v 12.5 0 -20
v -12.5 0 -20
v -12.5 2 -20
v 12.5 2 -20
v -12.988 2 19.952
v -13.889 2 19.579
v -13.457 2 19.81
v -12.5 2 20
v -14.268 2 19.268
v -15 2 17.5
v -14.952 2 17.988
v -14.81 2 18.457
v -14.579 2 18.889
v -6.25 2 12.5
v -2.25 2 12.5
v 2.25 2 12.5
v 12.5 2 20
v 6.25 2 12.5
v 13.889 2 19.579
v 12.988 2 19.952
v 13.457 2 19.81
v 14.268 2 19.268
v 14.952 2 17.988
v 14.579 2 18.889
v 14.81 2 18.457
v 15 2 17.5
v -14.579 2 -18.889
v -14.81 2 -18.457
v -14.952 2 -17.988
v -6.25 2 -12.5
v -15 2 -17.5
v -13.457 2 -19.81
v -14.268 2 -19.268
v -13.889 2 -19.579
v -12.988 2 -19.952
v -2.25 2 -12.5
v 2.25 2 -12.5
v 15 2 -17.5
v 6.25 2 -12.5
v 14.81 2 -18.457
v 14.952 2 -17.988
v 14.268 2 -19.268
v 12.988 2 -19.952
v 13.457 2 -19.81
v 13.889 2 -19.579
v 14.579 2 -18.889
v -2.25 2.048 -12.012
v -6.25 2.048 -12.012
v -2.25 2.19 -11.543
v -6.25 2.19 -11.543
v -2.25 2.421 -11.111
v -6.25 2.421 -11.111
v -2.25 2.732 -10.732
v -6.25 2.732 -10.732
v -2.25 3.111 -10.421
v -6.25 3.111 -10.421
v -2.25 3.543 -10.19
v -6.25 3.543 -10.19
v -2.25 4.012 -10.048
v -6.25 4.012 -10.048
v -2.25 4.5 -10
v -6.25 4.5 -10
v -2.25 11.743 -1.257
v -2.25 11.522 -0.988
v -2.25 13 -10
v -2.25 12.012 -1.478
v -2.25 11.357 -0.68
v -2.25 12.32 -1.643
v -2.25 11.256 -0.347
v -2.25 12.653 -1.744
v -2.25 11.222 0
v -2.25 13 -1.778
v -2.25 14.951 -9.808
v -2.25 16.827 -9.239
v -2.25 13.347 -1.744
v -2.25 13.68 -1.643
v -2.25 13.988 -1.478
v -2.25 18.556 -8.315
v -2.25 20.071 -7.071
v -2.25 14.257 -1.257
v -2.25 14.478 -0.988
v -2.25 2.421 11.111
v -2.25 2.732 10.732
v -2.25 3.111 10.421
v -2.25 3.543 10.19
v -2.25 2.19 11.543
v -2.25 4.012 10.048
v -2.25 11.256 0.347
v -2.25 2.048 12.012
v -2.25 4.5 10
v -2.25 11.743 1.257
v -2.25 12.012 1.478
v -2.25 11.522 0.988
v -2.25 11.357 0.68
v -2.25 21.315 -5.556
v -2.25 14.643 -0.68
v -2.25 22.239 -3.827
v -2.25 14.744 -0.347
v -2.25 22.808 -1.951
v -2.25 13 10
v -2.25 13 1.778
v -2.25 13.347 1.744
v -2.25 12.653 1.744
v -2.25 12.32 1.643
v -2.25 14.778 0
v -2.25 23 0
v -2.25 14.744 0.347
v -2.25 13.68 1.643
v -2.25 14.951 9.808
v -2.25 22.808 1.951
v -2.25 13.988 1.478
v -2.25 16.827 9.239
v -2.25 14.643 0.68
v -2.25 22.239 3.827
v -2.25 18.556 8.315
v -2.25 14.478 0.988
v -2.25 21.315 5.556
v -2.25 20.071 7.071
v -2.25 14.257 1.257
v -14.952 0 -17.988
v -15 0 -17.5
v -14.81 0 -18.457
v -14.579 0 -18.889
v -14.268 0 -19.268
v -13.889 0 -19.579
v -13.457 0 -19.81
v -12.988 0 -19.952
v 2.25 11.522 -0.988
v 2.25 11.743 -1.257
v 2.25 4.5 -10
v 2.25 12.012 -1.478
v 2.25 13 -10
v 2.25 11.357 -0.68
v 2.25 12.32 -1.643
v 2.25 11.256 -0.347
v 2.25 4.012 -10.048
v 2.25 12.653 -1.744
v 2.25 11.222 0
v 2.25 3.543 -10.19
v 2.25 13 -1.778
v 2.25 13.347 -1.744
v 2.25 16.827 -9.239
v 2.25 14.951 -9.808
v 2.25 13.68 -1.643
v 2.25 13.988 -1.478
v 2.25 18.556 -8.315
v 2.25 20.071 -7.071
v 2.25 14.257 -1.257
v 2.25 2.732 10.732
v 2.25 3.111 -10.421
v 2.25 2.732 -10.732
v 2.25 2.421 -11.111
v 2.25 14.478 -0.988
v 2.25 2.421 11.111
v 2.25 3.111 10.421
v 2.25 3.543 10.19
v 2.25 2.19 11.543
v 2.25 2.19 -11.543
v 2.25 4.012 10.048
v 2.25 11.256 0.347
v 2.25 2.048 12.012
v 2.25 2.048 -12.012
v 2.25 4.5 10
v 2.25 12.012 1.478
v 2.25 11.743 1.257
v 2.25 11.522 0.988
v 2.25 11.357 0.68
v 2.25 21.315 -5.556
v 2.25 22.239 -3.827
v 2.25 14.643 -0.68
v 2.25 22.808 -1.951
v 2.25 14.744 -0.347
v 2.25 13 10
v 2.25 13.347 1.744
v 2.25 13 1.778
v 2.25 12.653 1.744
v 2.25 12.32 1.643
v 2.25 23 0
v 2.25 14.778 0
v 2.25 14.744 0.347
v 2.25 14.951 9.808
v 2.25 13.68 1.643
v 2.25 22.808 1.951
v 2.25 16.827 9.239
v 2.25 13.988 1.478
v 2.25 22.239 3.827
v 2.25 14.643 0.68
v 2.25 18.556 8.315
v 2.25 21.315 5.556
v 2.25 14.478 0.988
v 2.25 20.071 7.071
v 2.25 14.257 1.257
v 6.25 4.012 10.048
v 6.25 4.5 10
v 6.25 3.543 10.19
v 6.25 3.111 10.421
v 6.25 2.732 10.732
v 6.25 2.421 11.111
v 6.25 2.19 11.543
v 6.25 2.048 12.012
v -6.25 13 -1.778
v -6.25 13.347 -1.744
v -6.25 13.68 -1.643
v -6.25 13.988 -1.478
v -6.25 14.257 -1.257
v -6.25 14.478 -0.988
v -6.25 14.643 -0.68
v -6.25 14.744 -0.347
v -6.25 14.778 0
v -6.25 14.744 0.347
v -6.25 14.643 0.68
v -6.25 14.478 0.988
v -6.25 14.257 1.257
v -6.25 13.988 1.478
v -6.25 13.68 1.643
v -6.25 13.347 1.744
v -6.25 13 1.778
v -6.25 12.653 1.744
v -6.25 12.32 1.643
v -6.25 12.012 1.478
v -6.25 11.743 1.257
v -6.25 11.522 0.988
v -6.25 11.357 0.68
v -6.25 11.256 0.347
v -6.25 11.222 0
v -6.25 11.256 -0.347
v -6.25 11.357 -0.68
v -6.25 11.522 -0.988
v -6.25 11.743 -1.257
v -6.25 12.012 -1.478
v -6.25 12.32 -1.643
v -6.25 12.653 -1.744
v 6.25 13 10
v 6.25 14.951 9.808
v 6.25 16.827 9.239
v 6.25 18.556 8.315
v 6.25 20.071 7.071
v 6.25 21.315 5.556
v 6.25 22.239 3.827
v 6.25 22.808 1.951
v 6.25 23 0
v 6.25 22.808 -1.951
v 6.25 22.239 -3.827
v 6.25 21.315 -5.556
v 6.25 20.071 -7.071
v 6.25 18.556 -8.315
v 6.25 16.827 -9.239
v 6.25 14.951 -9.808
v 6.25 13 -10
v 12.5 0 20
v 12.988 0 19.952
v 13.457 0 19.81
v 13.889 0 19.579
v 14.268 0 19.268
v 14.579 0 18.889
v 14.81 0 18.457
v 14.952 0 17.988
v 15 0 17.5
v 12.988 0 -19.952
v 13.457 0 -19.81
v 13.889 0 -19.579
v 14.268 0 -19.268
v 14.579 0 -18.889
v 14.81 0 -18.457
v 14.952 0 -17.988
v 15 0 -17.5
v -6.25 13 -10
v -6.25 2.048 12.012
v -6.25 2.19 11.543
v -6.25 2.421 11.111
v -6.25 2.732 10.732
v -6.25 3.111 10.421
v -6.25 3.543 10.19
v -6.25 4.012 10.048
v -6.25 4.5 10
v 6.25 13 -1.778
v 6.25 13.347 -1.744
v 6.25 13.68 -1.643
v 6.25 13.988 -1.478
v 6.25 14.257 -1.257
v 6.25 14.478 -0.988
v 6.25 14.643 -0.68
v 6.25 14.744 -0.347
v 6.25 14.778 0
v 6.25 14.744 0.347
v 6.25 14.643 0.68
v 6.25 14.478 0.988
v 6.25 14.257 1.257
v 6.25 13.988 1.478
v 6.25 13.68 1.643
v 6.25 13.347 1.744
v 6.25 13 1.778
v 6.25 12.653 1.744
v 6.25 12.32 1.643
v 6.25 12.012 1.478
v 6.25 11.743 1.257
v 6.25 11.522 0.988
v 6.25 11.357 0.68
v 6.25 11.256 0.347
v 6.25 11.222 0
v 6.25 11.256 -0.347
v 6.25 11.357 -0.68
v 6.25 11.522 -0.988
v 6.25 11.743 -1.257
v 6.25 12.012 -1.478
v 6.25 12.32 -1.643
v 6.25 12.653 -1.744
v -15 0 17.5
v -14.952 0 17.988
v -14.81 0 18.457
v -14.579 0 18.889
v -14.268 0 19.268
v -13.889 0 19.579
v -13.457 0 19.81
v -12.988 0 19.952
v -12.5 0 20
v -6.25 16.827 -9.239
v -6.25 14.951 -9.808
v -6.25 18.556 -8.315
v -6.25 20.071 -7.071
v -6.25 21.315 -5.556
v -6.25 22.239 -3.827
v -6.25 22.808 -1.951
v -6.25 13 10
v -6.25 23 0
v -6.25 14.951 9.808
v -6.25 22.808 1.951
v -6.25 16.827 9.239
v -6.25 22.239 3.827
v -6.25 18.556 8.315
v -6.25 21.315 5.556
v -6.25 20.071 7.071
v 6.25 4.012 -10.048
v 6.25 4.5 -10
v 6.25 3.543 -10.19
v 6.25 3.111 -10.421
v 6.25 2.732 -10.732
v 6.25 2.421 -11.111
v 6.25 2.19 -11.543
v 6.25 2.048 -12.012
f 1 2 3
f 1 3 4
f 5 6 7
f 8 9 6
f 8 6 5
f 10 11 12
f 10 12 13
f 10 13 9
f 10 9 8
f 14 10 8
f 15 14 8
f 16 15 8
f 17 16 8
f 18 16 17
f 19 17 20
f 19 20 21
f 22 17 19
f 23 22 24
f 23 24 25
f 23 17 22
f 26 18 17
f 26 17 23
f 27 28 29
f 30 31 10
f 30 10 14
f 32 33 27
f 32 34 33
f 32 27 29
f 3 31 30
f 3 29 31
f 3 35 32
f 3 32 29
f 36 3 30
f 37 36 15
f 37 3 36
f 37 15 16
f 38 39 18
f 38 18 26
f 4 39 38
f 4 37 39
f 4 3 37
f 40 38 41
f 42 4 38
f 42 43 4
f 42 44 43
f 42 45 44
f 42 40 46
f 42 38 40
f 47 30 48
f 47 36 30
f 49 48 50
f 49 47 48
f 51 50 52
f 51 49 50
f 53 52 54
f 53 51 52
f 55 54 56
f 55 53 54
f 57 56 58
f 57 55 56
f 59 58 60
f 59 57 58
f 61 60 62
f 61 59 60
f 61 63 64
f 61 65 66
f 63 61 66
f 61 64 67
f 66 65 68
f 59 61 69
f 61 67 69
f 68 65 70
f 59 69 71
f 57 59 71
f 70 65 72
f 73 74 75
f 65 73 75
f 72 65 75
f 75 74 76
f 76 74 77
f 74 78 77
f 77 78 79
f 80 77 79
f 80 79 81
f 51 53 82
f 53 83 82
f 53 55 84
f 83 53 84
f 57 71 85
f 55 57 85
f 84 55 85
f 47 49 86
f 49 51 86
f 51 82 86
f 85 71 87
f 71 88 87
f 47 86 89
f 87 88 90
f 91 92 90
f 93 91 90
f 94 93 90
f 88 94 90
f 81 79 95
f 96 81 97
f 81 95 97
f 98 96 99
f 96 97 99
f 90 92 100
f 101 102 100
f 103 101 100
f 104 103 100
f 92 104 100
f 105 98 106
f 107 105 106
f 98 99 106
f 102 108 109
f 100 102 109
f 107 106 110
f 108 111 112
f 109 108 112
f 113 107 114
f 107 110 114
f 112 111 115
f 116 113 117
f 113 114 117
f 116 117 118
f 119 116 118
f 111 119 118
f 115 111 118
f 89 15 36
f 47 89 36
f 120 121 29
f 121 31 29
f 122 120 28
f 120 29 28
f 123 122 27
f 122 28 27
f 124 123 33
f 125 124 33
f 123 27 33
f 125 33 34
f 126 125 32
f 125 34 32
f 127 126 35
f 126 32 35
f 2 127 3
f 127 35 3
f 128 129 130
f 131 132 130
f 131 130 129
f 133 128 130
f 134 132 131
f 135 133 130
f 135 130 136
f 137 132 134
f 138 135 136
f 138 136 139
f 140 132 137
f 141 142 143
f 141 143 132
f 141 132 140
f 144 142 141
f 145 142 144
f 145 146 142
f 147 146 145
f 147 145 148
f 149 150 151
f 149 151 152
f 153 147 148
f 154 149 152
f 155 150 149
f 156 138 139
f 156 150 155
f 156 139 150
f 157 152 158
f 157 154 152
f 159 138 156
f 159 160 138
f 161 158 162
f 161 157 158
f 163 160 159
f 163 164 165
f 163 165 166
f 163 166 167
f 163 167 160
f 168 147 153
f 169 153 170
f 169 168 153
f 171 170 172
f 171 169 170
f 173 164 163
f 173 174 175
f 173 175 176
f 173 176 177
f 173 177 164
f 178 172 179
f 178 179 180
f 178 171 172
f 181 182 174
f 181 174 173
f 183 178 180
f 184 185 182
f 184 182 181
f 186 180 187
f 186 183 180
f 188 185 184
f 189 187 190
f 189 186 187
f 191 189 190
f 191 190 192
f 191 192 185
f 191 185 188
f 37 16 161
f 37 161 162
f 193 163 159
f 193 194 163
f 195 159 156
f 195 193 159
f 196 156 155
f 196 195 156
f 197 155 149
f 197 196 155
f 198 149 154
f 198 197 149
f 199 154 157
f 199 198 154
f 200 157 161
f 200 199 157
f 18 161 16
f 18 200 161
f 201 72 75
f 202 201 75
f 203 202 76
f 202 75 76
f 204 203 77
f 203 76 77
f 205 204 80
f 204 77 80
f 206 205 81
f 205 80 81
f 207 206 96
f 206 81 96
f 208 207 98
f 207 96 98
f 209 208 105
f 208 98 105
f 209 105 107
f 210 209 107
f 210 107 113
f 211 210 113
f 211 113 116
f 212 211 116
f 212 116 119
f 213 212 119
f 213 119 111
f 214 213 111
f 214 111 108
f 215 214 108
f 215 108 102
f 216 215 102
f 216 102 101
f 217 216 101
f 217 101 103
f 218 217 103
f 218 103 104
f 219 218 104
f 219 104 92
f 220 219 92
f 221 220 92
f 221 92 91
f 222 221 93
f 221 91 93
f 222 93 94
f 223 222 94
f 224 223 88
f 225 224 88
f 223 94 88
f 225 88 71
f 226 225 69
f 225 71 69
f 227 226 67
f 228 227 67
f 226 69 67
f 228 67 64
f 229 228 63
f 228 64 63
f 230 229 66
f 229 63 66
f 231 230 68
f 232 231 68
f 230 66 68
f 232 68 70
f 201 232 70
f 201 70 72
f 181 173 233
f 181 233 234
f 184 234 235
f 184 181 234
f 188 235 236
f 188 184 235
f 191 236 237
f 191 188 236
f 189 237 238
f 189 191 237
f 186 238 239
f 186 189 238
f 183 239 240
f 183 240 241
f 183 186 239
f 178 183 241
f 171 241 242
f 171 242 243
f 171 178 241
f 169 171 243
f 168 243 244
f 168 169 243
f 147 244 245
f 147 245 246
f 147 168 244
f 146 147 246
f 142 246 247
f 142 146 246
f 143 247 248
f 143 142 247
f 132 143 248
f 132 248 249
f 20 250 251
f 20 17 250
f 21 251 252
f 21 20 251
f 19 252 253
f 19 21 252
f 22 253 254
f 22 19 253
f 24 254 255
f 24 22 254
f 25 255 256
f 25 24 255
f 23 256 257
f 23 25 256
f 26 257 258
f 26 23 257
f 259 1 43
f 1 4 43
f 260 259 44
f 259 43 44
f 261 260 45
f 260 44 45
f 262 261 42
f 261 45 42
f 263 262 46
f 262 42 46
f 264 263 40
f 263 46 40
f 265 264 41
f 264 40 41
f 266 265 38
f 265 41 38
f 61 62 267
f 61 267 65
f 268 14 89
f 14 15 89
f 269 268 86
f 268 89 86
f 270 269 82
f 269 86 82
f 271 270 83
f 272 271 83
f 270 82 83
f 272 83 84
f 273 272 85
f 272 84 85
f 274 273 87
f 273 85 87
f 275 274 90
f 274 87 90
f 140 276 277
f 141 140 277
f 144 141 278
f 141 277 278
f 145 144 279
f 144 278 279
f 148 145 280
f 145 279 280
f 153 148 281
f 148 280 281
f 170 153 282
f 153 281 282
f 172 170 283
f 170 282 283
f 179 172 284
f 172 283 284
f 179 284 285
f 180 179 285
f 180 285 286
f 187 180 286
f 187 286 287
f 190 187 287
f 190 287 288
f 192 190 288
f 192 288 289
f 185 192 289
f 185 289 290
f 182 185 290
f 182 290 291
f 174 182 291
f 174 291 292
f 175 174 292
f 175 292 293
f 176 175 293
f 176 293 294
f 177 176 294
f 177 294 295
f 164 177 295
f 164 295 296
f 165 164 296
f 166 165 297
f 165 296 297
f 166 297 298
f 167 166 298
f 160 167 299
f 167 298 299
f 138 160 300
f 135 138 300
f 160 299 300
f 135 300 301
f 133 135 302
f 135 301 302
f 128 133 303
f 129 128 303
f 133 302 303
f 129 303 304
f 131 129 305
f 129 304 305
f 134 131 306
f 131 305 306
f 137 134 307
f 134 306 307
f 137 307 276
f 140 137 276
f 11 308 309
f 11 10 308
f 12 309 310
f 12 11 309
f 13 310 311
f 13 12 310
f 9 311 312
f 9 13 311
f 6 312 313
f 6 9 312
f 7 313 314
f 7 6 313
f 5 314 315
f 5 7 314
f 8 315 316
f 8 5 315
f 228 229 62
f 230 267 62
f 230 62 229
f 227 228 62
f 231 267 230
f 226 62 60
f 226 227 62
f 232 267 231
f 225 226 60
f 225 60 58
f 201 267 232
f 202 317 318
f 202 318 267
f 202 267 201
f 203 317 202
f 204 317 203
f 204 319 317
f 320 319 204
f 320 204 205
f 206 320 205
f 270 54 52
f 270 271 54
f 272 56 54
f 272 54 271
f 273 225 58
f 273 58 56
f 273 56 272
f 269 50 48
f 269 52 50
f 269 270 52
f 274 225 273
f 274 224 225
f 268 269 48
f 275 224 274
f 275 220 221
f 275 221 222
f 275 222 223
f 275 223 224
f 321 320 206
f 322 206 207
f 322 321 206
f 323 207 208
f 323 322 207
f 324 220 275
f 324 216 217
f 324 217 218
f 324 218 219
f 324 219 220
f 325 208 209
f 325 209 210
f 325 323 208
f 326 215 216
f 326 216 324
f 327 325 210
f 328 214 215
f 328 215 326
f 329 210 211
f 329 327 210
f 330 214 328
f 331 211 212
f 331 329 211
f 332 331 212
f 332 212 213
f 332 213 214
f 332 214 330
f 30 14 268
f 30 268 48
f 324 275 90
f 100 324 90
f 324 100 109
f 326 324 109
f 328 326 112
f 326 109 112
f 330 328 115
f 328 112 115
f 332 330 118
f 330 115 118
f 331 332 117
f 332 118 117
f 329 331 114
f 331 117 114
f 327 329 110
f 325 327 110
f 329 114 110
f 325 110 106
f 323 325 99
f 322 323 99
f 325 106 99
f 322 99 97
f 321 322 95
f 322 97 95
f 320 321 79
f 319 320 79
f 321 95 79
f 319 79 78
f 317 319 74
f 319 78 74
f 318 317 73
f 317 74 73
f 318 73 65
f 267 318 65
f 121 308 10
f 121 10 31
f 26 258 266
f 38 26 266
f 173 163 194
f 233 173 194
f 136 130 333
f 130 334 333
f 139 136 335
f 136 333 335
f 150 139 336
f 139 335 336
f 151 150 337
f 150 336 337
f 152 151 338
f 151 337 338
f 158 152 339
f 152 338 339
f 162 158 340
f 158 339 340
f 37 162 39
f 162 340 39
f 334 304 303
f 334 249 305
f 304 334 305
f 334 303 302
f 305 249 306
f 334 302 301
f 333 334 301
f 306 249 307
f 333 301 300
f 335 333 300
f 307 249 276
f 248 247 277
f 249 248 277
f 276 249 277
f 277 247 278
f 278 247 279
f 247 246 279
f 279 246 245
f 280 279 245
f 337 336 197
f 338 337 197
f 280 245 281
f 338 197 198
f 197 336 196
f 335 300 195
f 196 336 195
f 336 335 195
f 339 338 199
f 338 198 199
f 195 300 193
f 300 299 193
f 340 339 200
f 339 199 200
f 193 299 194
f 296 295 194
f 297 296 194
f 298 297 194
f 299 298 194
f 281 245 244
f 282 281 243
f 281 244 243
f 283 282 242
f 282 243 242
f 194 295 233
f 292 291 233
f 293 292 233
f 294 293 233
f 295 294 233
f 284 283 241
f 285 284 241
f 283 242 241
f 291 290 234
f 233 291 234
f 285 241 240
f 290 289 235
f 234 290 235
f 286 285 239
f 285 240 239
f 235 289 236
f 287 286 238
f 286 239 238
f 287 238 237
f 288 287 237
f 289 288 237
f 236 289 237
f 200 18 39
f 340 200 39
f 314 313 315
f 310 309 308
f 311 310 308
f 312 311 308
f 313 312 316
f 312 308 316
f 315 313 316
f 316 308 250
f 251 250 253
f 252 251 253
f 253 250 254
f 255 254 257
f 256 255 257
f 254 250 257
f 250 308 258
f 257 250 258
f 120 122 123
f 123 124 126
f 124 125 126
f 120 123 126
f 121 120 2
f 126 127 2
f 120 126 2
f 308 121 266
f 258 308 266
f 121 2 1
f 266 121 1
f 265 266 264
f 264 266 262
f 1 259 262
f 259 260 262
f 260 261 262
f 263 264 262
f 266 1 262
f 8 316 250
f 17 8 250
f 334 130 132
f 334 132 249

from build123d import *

# Parameters (mm, degrees)
ESQUISSE1_W             = 30
ESQUISSE1_H             = 40
BOSS_EXTRU_1_DEPTH      = 2
ESQUISSE2_W             = 4
ESQUISSE2_H             = 20
BOSS_EXTRU_2_DEPTH      = 11
BOSS_EXTRU_3_START      = -4
BOSS_EXTRU_3_DEPTH      = 4
BOSS_EXTRU_4_START      = -4
BOSS_EXTRU_4_DEPTH      = 4
ESQUISSE5_R             = 1.778
ENL_V_MAT_EXTRU_1_DEPTH = 12.5
CONG_1_R                = 2.5


with BuildPart() as part:
    # Esquisse1 → Boss.-Extru.1 (new body)
    with BuildSketch(Plane(origin=(0, 0, 0), x_dir=(1, 0, 0), z_dir=(0, 1, 0))):
        Rectangle(ESQUISSE1_W, ESQUISSE1_H)
    extrude(amount=BOSS_EXTRU_1_DEPTH)

    # Esquisse2 → Boss.-Extru.2 (add)
    with BuildSketch(Plane(origin=(0, 2, 0), x_dir=(1, 0, 0), z_dir=(0, 1, 0))):
        with Locations((4.25, 0)):
            Rectangle(ESQUISSE2_W, ESQUISSE2_H)
        with Locations((-4.25, 0)):
            Rectangle(ESQUISSE2_W, ESQUISSE2_H)
    extrude(amount=BOSS_EXTRU_2_DEPTH)

    # Esquisse3 → Boss.-Extru.3 (add)
    with BuildSketch(Plane.ZY.offset(6.25).offset(BOSS_EXTRU_3_START)):
        with BuildLine():
            Line((-10, 13), (10, 13))
            ThreePointArc((10, 13), (0, 23), (-10, 13))
        make_face()
    extrude(amount=BOSS_EXTRU_3_DEPTH)

    # Esquisse4 → Boss.-Extru.4 (add)
    with BuildSketch(Plane(origin=(6.25, 0, 0), x_dir=(0, 0, -1), z_dir=(1, 0, 0)).offset(BOSS_EXTRU_4_START)):
        with BuildLine():
            Line((10, 13), (-10, 13))
            ThreePointArc((-10, 13), (0, 23), (10, 13))
        make_face()
    extrude(amount=BOSS_EXTRU_4_DEPTH)

    # Esquisse5 → Enlèv. mat.-Extru.1 (cut)
    with BuildSketch(Plane(origin=(6.25, 0, 0), x_dir=(0, 0, -1), z_dir=(1, 0, 0))):
        with Locations((0, 13)):
            Circle(ESQUISSE5_R)
    extrude(amount=-ENL_V_MAT_EXTRU_1_DEPTH, mode=Mode.SUBTRACT)

    # Congé1
    cong_1_edges = [part.edges().sort_by_distance(p)[0] for p in [
        (4.25, 2, 10),
        (4.25, 2, -10),
        (-4.25, 2, -10),
        (-4.25, 2, 10),
        (-15, 1, -20),
        (15, 1, -20),
        (15, 1, 20),
        (-15, 1, 20),
    ]]
    fillet(cong_1_edges, radius=CONG_1_R)


solid = part.part
